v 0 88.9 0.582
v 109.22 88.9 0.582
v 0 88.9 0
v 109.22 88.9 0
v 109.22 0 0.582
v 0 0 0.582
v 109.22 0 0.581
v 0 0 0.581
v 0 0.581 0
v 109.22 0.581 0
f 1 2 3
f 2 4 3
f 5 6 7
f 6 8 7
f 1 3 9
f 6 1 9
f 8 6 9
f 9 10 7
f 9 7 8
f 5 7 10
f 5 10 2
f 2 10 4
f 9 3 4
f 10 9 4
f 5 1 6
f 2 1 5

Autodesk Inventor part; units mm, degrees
ref_plane "YZ Plane" through (0, 0, 0) normal (1, 0, 0) x (0, 1, 0)
ref_plane "XZ Plane" through (0, 0, 0) normal (0, 1, 0) x (-1, 0, 0)
ref_plane "XY Plane" through (0, 0, 0) normal (0, 0, 1) x (1, 0, 0)
sketch "Sketch1" plane through (0, 0, 0) normal (0, 0, 1) x (1, 0, 0)
  line L0 (0, 0) -> (109.22, 0)
  line L1 (109.22, 0) -> (109.22, 88.9)
  line L2 (109.22, 88.9) -> (0, 88.9)
  line L3 (0, 88.9) -> (0, 0)
  dimension "d0" = 109.22
  dimension "d1" = 88.9
extrude "Extrusion1" add sketch "Sketch1" along normal blind 0.5817
chamfer "Chamfer2" distance 0.5817 angle 45 1 edges at (54.61, 0, 0)
properties part number "Plate_Top_Alu25" material "Steel"
